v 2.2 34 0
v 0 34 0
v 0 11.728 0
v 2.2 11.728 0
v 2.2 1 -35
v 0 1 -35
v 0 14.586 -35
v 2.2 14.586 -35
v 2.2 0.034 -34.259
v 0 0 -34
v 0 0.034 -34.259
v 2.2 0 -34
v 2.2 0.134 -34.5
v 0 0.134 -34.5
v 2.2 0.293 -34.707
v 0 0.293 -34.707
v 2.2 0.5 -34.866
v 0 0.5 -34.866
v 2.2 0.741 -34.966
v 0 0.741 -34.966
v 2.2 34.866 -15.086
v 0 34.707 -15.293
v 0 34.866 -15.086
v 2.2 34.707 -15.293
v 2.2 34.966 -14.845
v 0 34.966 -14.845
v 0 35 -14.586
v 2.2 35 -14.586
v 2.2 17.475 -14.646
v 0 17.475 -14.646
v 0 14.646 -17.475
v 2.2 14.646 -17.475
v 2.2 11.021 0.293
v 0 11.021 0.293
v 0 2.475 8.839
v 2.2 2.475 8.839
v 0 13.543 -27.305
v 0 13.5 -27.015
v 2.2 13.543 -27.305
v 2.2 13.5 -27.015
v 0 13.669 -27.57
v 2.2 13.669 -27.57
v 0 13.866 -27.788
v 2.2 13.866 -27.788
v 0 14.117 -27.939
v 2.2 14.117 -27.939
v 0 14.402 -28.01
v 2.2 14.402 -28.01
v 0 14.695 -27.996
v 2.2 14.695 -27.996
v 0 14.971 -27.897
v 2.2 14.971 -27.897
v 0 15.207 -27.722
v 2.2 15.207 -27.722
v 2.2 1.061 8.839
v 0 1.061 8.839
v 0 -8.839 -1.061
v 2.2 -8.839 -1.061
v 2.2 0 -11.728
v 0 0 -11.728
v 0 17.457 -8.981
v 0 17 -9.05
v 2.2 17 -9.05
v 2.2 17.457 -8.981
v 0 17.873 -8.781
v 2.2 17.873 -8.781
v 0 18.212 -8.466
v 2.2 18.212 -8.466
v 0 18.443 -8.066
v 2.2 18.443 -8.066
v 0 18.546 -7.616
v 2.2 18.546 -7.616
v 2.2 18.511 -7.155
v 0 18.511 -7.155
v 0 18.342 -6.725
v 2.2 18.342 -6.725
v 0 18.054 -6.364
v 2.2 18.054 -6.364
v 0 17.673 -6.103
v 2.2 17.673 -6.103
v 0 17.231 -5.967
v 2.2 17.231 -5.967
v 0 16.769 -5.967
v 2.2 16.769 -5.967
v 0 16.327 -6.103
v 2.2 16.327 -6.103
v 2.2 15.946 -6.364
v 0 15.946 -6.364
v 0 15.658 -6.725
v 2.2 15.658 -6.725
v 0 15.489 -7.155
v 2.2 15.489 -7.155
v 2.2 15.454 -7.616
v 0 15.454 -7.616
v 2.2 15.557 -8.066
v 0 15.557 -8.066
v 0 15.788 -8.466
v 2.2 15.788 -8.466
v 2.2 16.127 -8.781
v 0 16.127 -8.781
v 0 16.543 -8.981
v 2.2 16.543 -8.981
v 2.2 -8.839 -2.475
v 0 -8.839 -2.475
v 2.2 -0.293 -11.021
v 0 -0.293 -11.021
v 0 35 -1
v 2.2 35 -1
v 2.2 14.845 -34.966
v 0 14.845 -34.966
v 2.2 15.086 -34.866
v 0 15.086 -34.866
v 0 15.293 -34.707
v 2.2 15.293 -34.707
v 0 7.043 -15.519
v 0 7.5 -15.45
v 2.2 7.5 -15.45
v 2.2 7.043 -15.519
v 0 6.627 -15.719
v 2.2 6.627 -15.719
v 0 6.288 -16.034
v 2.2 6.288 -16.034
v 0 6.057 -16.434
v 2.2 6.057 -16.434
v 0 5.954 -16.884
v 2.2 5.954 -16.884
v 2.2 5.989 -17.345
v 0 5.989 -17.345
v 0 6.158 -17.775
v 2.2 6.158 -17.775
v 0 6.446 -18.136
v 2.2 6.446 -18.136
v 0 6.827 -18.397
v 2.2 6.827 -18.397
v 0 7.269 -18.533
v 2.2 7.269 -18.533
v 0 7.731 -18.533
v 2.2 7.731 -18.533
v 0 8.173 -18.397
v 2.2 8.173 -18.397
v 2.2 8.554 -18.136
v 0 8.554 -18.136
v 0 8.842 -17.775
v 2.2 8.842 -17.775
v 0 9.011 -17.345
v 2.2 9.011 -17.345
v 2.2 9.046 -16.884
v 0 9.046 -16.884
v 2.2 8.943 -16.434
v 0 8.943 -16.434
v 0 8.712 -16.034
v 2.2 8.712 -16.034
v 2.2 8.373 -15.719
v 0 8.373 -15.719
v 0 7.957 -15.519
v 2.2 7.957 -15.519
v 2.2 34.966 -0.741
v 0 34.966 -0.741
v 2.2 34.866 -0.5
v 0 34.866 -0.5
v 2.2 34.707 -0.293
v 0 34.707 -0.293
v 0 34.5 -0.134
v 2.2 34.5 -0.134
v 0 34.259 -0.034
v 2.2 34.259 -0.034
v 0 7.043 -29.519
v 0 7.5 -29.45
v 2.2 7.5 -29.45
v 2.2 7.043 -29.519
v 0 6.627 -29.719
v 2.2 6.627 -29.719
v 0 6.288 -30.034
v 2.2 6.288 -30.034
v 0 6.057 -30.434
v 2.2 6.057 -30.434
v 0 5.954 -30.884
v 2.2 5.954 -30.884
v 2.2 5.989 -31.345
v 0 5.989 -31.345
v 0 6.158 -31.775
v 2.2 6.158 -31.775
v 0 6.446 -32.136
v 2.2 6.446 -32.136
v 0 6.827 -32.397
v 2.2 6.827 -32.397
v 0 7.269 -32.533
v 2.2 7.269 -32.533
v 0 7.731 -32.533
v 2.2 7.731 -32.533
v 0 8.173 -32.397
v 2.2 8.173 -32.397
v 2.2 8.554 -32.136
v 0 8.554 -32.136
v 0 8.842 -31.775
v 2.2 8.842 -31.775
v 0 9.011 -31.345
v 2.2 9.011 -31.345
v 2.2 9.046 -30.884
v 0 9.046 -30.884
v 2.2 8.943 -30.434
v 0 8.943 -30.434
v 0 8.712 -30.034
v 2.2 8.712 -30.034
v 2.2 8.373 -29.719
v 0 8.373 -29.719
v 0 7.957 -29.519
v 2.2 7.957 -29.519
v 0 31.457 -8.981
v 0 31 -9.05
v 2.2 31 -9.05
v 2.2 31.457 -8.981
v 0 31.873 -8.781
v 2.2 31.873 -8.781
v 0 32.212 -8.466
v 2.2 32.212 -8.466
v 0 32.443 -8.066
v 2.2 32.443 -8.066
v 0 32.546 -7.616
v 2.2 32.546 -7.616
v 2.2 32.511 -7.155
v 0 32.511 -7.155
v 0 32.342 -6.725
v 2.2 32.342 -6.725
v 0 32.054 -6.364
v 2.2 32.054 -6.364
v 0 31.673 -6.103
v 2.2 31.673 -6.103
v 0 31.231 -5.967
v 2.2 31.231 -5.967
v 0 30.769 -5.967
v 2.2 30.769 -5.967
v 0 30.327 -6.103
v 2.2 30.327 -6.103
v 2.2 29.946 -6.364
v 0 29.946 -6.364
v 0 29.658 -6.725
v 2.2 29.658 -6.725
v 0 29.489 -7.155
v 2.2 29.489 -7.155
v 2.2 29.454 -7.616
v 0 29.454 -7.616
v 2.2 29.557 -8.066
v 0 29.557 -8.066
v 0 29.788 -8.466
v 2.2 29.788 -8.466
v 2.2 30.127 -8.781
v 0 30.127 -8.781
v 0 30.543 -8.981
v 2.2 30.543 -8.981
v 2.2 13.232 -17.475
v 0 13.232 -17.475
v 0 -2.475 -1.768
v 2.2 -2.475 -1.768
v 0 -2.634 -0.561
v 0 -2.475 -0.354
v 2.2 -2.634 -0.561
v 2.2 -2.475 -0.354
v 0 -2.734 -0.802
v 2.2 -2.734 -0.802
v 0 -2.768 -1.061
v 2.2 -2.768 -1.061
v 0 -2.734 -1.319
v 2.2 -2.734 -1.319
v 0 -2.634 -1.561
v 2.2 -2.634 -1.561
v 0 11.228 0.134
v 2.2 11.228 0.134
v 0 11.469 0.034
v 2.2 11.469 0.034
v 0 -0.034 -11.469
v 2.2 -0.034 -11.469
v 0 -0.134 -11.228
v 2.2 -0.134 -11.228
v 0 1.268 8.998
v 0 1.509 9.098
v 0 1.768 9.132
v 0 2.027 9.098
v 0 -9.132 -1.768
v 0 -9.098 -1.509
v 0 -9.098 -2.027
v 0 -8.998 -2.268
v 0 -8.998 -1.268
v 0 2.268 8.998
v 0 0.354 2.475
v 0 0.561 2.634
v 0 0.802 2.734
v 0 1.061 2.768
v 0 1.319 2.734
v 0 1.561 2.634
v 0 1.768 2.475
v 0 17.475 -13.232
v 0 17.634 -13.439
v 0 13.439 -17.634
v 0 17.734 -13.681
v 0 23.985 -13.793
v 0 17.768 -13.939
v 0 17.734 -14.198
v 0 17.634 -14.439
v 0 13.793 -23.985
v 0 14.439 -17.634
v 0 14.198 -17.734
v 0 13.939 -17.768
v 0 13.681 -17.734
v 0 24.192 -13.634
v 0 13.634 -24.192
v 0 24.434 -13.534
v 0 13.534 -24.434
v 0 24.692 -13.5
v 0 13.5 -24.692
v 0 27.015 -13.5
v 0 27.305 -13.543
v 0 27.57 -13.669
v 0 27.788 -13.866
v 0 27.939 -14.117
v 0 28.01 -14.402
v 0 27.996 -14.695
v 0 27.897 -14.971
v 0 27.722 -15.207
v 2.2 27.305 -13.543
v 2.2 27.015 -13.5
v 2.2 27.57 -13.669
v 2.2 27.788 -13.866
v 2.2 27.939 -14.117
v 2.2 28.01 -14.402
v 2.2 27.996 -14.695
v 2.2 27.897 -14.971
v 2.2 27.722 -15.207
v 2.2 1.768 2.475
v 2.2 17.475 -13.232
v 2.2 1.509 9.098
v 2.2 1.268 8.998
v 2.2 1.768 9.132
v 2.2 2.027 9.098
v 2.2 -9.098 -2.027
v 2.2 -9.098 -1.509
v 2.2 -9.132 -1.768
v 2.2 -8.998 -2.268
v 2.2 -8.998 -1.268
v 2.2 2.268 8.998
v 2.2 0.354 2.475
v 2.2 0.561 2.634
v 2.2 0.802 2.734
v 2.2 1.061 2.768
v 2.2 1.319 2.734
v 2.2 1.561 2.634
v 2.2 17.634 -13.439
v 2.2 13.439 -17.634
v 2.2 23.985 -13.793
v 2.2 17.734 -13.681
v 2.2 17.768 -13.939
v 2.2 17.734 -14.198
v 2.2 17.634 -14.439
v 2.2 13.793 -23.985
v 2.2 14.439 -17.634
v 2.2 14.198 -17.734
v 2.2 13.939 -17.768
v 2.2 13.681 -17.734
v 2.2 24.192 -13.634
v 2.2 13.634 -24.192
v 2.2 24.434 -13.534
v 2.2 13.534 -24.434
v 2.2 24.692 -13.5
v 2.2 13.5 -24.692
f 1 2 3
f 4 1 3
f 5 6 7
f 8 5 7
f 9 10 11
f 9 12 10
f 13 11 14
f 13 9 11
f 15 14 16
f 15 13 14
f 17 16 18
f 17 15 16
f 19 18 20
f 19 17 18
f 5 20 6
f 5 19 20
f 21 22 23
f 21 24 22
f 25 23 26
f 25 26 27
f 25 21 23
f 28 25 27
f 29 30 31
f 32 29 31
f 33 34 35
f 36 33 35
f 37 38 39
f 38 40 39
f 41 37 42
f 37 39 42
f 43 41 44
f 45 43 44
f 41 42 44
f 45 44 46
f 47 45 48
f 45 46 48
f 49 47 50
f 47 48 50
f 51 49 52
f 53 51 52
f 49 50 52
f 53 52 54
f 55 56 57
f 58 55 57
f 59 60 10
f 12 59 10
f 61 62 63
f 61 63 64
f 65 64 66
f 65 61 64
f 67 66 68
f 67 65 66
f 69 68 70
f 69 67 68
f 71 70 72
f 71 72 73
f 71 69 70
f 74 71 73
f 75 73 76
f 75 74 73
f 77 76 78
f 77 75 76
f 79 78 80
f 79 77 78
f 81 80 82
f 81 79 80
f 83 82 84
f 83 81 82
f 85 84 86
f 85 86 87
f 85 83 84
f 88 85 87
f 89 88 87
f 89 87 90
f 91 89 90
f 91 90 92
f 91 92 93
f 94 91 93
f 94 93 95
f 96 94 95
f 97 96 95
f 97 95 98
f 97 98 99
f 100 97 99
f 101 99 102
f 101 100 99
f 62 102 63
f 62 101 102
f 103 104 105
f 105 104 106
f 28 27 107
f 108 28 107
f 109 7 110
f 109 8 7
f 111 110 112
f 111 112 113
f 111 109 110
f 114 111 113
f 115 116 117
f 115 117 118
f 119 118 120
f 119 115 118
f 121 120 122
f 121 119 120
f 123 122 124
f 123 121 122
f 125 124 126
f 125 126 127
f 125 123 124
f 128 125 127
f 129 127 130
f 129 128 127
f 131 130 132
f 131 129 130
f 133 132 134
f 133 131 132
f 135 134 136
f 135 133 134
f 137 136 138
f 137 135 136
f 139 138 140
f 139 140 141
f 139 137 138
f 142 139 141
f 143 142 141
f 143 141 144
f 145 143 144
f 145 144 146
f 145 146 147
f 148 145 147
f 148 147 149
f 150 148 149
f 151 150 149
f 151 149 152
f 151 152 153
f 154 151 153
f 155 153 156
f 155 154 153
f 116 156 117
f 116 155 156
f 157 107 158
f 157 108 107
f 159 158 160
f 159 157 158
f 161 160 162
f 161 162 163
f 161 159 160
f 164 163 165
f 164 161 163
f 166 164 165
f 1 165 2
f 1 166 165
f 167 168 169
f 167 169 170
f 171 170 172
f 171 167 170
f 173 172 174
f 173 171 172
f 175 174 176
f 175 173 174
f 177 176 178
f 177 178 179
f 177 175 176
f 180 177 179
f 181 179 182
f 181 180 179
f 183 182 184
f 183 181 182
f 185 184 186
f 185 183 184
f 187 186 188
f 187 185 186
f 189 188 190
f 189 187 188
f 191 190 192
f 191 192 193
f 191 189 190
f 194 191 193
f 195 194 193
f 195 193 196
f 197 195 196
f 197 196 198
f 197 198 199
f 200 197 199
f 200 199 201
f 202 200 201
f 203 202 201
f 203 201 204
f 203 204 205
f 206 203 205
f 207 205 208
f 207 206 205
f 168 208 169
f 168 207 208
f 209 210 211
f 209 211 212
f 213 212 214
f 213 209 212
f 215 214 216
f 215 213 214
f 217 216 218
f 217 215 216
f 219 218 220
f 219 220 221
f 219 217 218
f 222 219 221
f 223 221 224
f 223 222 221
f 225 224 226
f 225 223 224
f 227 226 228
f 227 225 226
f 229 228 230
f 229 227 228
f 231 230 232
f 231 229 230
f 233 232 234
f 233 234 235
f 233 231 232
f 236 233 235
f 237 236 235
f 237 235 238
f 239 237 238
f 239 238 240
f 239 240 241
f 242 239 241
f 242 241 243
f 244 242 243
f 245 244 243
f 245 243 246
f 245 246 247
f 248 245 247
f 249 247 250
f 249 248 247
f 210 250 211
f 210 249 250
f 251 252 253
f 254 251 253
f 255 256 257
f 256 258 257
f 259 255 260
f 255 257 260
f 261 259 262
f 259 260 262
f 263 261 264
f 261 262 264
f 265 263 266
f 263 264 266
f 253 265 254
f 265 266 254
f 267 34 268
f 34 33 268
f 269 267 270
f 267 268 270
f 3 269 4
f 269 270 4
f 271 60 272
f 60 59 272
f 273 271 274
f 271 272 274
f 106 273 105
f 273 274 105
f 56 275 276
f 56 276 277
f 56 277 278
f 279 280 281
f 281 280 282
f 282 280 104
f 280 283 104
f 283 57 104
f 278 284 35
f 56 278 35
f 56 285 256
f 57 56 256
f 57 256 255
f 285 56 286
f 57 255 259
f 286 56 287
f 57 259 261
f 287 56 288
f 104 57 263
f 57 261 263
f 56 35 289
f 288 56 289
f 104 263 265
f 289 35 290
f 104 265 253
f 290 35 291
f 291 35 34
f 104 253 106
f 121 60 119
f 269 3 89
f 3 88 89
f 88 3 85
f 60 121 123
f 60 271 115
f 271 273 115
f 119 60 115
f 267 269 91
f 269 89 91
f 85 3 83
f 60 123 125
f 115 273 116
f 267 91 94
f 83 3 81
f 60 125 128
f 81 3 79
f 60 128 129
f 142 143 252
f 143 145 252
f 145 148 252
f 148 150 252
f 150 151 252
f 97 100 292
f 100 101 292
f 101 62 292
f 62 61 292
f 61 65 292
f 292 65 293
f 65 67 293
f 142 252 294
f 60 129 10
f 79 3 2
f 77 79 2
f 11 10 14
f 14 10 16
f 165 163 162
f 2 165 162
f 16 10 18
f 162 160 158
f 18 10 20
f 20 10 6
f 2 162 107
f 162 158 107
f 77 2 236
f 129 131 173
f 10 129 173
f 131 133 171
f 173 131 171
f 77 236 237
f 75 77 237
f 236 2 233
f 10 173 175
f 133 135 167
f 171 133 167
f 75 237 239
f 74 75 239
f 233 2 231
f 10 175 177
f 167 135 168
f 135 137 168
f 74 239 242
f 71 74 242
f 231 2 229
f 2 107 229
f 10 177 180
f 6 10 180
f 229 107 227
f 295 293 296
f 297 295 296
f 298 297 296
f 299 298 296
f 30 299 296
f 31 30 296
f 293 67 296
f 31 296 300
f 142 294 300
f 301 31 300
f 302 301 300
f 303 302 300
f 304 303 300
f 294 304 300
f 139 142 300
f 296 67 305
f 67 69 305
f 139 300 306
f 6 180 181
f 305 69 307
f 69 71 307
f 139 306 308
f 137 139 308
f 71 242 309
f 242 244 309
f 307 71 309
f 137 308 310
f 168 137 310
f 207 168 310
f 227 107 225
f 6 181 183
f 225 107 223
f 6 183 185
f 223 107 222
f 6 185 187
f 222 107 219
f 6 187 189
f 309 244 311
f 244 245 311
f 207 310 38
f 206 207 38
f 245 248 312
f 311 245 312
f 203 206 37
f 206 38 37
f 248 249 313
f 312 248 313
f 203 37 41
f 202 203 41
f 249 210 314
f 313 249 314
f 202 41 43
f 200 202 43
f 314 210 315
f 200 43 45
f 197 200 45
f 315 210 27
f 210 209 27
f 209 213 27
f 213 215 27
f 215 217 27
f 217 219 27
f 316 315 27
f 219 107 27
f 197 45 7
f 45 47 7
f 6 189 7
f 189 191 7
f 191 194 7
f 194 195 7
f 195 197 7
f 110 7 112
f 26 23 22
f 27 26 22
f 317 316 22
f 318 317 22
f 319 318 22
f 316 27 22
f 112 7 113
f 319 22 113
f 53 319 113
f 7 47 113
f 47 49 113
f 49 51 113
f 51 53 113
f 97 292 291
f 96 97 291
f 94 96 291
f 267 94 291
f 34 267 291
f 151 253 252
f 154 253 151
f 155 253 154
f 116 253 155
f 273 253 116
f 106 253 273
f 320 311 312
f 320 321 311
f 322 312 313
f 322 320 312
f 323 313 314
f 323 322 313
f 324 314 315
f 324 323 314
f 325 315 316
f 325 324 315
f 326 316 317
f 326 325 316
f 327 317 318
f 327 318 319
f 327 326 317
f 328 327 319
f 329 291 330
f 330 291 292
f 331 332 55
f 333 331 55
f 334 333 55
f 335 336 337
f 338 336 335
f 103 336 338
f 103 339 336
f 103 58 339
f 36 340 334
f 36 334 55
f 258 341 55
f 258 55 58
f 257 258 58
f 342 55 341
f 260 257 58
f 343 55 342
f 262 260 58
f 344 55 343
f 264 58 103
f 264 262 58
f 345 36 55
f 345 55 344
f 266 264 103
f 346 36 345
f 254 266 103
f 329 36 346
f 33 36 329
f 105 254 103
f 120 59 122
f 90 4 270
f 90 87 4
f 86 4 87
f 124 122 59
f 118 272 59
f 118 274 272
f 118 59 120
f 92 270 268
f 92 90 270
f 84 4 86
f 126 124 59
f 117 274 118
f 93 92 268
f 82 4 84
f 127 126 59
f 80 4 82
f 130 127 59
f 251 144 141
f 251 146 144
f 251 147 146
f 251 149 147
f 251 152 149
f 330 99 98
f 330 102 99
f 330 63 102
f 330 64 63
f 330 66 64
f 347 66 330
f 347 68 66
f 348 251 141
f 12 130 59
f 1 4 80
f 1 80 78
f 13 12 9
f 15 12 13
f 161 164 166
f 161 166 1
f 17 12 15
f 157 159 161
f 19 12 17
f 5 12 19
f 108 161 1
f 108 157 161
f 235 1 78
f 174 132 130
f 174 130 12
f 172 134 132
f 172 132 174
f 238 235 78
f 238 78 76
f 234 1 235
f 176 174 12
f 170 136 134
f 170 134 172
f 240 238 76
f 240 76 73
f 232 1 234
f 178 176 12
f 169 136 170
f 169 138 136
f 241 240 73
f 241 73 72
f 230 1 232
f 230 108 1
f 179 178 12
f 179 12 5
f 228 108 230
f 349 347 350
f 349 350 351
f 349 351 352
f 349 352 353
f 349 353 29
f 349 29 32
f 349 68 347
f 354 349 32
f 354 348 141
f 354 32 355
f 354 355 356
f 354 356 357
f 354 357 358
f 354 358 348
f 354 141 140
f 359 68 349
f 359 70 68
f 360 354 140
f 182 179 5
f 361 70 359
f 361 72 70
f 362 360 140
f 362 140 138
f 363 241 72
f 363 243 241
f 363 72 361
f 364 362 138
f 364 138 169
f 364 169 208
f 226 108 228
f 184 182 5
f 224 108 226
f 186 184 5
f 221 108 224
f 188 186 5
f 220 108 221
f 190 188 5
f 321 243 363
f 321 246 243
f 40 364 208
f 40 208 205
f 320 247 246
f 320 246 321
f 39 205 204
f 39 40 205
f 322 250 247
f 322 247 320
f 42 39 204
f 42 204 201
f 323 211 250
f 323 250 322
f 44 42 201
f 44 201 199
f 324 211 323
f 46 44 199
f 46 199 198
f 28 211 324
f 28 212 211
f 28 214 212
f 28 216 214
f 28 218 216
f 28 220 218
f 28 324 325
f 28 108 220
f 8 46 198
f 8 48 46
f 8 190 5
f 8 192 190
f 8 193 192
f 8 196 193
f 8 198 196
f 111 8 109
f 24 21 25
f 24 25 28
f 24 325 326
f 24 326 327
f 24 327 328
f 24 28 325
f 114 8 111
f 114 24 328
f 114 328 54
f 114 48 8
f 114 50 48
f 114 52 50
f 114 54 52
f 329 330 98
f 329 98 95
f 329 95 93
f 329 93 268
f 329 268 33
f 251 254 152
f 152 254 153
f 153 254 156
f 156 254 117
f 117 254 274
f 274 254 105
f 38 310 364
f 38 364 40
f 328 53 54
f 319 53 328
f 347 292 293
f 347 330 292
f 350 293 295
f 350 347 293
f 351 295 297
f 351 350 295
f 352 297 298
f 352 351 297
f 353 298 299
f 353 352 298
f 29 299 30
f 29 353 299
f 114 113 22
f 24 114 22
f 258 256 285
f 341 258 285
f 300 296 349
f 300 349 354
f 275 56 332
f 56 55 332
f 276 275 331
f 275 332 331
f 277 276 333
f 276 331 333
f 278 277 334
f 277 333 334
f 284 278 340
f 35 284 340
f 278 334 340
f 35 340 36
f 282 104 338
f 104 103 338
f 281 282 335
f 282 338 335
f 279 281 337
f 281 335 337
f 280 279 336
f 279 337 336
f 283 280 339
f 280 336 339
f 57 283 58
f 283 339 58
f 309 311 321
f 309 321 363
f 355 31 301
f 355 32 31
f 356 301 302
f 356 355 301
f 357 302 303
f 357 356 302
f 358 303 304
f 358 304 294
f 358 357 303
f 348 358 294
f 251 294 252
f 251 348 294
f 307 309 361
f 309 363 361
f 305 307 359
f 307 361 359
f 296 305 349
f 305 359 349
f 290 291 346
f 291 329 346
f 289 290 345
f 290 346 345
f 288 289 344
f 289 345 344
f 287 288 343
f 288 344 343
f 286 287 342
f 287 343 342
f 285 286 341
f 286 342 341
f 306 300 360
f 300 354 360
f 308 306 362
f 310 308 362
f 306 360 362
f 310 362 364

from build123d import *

# Parameters (mm, degrees)
SKETCH_1_R      = 1.55
EXTRUDE_1_DEPTH = 2.2
FILLET_1_R      = 1


with BuildPart() as part:
    # 草图1 → 凸台-拉伸1 (new body)
    with BuildSketch(Plane(origin=(0, 0, 0), x_dir=(0, 0, -1), z_dir=(1, 0, 0))):
        Polygon((11.313708499, 0), (35, 0), (35, 15), (15, 35), (0, 35), (0, 11.313708499), (-9.545941546, 1.767766953), (1.767766953, -9.545941546), align=None)
        with Locations((7.5, 31)):
            Circle(SKETCH_1_R, mode=Mode.SUBTRACT)
        with Locations((7.5, 17)):
            Circle(SKETCH_1_R, mode=Mode.SUBTRACT)
        with Locations(Location((31, 7.5, 0), (0, 0, 180))):
            Circle(SKETCH_1_R, mode=Mode.SUBTRACT)
        with Locations(Location((17, 7.5, 0), (0, 0, 180))):
            Circle(SKETCH_1_R, mode=Mode.SUBTRACT)
        Polygon((13.939339828, 18.181980515), (18.181980515, 13.939339828), (1.060660172, -3.181980515), (-3.181980515, 1.060660172), align=None, mode=Mode.SUBTRACT)
        Polygon((13.5, 29.428932188), (13.5, 24.278174593), (24.278174593, 13.5), (29.428932188, 13.5), align=None, mode=Mode.SUBTRACT)
    extrude(amount=EXTRUDE_1_DEPTH)

    # 圆角1
    fillet_1_edges = [part.edges().sort_by_distance(p)[0] for p in [
        (1.1, 35, 0),
        (1.1, 35, -15),
        (1.1, 15, -35),
        (1.1, 0, -35),
        (1.1, 0, -11.313708499),
        (1.1, -9.545941546, -1.767766953),
        (1.1, 1.767766953, 9.545941546),
        (1.1, 11.313708499, 0),
        (1.1, 18.181980515, -13.939339828),
        (1.1, 1.060660172, 3.181980515),
        (1.1, -3.181980515, -1.060660172),
        (1.1, 13.939339828, -18.181980515),
        (1.1, 13.5, -24.278174593),
        (1.1, 13.5, -29.428932188),
        (1.1, 29.428932188, -13.5),
        (1.1, 24.278174593, -13.5),
    ]]
    fillet(fillet_1_edges, radius=FILLET_1_R)


solid = part.part
